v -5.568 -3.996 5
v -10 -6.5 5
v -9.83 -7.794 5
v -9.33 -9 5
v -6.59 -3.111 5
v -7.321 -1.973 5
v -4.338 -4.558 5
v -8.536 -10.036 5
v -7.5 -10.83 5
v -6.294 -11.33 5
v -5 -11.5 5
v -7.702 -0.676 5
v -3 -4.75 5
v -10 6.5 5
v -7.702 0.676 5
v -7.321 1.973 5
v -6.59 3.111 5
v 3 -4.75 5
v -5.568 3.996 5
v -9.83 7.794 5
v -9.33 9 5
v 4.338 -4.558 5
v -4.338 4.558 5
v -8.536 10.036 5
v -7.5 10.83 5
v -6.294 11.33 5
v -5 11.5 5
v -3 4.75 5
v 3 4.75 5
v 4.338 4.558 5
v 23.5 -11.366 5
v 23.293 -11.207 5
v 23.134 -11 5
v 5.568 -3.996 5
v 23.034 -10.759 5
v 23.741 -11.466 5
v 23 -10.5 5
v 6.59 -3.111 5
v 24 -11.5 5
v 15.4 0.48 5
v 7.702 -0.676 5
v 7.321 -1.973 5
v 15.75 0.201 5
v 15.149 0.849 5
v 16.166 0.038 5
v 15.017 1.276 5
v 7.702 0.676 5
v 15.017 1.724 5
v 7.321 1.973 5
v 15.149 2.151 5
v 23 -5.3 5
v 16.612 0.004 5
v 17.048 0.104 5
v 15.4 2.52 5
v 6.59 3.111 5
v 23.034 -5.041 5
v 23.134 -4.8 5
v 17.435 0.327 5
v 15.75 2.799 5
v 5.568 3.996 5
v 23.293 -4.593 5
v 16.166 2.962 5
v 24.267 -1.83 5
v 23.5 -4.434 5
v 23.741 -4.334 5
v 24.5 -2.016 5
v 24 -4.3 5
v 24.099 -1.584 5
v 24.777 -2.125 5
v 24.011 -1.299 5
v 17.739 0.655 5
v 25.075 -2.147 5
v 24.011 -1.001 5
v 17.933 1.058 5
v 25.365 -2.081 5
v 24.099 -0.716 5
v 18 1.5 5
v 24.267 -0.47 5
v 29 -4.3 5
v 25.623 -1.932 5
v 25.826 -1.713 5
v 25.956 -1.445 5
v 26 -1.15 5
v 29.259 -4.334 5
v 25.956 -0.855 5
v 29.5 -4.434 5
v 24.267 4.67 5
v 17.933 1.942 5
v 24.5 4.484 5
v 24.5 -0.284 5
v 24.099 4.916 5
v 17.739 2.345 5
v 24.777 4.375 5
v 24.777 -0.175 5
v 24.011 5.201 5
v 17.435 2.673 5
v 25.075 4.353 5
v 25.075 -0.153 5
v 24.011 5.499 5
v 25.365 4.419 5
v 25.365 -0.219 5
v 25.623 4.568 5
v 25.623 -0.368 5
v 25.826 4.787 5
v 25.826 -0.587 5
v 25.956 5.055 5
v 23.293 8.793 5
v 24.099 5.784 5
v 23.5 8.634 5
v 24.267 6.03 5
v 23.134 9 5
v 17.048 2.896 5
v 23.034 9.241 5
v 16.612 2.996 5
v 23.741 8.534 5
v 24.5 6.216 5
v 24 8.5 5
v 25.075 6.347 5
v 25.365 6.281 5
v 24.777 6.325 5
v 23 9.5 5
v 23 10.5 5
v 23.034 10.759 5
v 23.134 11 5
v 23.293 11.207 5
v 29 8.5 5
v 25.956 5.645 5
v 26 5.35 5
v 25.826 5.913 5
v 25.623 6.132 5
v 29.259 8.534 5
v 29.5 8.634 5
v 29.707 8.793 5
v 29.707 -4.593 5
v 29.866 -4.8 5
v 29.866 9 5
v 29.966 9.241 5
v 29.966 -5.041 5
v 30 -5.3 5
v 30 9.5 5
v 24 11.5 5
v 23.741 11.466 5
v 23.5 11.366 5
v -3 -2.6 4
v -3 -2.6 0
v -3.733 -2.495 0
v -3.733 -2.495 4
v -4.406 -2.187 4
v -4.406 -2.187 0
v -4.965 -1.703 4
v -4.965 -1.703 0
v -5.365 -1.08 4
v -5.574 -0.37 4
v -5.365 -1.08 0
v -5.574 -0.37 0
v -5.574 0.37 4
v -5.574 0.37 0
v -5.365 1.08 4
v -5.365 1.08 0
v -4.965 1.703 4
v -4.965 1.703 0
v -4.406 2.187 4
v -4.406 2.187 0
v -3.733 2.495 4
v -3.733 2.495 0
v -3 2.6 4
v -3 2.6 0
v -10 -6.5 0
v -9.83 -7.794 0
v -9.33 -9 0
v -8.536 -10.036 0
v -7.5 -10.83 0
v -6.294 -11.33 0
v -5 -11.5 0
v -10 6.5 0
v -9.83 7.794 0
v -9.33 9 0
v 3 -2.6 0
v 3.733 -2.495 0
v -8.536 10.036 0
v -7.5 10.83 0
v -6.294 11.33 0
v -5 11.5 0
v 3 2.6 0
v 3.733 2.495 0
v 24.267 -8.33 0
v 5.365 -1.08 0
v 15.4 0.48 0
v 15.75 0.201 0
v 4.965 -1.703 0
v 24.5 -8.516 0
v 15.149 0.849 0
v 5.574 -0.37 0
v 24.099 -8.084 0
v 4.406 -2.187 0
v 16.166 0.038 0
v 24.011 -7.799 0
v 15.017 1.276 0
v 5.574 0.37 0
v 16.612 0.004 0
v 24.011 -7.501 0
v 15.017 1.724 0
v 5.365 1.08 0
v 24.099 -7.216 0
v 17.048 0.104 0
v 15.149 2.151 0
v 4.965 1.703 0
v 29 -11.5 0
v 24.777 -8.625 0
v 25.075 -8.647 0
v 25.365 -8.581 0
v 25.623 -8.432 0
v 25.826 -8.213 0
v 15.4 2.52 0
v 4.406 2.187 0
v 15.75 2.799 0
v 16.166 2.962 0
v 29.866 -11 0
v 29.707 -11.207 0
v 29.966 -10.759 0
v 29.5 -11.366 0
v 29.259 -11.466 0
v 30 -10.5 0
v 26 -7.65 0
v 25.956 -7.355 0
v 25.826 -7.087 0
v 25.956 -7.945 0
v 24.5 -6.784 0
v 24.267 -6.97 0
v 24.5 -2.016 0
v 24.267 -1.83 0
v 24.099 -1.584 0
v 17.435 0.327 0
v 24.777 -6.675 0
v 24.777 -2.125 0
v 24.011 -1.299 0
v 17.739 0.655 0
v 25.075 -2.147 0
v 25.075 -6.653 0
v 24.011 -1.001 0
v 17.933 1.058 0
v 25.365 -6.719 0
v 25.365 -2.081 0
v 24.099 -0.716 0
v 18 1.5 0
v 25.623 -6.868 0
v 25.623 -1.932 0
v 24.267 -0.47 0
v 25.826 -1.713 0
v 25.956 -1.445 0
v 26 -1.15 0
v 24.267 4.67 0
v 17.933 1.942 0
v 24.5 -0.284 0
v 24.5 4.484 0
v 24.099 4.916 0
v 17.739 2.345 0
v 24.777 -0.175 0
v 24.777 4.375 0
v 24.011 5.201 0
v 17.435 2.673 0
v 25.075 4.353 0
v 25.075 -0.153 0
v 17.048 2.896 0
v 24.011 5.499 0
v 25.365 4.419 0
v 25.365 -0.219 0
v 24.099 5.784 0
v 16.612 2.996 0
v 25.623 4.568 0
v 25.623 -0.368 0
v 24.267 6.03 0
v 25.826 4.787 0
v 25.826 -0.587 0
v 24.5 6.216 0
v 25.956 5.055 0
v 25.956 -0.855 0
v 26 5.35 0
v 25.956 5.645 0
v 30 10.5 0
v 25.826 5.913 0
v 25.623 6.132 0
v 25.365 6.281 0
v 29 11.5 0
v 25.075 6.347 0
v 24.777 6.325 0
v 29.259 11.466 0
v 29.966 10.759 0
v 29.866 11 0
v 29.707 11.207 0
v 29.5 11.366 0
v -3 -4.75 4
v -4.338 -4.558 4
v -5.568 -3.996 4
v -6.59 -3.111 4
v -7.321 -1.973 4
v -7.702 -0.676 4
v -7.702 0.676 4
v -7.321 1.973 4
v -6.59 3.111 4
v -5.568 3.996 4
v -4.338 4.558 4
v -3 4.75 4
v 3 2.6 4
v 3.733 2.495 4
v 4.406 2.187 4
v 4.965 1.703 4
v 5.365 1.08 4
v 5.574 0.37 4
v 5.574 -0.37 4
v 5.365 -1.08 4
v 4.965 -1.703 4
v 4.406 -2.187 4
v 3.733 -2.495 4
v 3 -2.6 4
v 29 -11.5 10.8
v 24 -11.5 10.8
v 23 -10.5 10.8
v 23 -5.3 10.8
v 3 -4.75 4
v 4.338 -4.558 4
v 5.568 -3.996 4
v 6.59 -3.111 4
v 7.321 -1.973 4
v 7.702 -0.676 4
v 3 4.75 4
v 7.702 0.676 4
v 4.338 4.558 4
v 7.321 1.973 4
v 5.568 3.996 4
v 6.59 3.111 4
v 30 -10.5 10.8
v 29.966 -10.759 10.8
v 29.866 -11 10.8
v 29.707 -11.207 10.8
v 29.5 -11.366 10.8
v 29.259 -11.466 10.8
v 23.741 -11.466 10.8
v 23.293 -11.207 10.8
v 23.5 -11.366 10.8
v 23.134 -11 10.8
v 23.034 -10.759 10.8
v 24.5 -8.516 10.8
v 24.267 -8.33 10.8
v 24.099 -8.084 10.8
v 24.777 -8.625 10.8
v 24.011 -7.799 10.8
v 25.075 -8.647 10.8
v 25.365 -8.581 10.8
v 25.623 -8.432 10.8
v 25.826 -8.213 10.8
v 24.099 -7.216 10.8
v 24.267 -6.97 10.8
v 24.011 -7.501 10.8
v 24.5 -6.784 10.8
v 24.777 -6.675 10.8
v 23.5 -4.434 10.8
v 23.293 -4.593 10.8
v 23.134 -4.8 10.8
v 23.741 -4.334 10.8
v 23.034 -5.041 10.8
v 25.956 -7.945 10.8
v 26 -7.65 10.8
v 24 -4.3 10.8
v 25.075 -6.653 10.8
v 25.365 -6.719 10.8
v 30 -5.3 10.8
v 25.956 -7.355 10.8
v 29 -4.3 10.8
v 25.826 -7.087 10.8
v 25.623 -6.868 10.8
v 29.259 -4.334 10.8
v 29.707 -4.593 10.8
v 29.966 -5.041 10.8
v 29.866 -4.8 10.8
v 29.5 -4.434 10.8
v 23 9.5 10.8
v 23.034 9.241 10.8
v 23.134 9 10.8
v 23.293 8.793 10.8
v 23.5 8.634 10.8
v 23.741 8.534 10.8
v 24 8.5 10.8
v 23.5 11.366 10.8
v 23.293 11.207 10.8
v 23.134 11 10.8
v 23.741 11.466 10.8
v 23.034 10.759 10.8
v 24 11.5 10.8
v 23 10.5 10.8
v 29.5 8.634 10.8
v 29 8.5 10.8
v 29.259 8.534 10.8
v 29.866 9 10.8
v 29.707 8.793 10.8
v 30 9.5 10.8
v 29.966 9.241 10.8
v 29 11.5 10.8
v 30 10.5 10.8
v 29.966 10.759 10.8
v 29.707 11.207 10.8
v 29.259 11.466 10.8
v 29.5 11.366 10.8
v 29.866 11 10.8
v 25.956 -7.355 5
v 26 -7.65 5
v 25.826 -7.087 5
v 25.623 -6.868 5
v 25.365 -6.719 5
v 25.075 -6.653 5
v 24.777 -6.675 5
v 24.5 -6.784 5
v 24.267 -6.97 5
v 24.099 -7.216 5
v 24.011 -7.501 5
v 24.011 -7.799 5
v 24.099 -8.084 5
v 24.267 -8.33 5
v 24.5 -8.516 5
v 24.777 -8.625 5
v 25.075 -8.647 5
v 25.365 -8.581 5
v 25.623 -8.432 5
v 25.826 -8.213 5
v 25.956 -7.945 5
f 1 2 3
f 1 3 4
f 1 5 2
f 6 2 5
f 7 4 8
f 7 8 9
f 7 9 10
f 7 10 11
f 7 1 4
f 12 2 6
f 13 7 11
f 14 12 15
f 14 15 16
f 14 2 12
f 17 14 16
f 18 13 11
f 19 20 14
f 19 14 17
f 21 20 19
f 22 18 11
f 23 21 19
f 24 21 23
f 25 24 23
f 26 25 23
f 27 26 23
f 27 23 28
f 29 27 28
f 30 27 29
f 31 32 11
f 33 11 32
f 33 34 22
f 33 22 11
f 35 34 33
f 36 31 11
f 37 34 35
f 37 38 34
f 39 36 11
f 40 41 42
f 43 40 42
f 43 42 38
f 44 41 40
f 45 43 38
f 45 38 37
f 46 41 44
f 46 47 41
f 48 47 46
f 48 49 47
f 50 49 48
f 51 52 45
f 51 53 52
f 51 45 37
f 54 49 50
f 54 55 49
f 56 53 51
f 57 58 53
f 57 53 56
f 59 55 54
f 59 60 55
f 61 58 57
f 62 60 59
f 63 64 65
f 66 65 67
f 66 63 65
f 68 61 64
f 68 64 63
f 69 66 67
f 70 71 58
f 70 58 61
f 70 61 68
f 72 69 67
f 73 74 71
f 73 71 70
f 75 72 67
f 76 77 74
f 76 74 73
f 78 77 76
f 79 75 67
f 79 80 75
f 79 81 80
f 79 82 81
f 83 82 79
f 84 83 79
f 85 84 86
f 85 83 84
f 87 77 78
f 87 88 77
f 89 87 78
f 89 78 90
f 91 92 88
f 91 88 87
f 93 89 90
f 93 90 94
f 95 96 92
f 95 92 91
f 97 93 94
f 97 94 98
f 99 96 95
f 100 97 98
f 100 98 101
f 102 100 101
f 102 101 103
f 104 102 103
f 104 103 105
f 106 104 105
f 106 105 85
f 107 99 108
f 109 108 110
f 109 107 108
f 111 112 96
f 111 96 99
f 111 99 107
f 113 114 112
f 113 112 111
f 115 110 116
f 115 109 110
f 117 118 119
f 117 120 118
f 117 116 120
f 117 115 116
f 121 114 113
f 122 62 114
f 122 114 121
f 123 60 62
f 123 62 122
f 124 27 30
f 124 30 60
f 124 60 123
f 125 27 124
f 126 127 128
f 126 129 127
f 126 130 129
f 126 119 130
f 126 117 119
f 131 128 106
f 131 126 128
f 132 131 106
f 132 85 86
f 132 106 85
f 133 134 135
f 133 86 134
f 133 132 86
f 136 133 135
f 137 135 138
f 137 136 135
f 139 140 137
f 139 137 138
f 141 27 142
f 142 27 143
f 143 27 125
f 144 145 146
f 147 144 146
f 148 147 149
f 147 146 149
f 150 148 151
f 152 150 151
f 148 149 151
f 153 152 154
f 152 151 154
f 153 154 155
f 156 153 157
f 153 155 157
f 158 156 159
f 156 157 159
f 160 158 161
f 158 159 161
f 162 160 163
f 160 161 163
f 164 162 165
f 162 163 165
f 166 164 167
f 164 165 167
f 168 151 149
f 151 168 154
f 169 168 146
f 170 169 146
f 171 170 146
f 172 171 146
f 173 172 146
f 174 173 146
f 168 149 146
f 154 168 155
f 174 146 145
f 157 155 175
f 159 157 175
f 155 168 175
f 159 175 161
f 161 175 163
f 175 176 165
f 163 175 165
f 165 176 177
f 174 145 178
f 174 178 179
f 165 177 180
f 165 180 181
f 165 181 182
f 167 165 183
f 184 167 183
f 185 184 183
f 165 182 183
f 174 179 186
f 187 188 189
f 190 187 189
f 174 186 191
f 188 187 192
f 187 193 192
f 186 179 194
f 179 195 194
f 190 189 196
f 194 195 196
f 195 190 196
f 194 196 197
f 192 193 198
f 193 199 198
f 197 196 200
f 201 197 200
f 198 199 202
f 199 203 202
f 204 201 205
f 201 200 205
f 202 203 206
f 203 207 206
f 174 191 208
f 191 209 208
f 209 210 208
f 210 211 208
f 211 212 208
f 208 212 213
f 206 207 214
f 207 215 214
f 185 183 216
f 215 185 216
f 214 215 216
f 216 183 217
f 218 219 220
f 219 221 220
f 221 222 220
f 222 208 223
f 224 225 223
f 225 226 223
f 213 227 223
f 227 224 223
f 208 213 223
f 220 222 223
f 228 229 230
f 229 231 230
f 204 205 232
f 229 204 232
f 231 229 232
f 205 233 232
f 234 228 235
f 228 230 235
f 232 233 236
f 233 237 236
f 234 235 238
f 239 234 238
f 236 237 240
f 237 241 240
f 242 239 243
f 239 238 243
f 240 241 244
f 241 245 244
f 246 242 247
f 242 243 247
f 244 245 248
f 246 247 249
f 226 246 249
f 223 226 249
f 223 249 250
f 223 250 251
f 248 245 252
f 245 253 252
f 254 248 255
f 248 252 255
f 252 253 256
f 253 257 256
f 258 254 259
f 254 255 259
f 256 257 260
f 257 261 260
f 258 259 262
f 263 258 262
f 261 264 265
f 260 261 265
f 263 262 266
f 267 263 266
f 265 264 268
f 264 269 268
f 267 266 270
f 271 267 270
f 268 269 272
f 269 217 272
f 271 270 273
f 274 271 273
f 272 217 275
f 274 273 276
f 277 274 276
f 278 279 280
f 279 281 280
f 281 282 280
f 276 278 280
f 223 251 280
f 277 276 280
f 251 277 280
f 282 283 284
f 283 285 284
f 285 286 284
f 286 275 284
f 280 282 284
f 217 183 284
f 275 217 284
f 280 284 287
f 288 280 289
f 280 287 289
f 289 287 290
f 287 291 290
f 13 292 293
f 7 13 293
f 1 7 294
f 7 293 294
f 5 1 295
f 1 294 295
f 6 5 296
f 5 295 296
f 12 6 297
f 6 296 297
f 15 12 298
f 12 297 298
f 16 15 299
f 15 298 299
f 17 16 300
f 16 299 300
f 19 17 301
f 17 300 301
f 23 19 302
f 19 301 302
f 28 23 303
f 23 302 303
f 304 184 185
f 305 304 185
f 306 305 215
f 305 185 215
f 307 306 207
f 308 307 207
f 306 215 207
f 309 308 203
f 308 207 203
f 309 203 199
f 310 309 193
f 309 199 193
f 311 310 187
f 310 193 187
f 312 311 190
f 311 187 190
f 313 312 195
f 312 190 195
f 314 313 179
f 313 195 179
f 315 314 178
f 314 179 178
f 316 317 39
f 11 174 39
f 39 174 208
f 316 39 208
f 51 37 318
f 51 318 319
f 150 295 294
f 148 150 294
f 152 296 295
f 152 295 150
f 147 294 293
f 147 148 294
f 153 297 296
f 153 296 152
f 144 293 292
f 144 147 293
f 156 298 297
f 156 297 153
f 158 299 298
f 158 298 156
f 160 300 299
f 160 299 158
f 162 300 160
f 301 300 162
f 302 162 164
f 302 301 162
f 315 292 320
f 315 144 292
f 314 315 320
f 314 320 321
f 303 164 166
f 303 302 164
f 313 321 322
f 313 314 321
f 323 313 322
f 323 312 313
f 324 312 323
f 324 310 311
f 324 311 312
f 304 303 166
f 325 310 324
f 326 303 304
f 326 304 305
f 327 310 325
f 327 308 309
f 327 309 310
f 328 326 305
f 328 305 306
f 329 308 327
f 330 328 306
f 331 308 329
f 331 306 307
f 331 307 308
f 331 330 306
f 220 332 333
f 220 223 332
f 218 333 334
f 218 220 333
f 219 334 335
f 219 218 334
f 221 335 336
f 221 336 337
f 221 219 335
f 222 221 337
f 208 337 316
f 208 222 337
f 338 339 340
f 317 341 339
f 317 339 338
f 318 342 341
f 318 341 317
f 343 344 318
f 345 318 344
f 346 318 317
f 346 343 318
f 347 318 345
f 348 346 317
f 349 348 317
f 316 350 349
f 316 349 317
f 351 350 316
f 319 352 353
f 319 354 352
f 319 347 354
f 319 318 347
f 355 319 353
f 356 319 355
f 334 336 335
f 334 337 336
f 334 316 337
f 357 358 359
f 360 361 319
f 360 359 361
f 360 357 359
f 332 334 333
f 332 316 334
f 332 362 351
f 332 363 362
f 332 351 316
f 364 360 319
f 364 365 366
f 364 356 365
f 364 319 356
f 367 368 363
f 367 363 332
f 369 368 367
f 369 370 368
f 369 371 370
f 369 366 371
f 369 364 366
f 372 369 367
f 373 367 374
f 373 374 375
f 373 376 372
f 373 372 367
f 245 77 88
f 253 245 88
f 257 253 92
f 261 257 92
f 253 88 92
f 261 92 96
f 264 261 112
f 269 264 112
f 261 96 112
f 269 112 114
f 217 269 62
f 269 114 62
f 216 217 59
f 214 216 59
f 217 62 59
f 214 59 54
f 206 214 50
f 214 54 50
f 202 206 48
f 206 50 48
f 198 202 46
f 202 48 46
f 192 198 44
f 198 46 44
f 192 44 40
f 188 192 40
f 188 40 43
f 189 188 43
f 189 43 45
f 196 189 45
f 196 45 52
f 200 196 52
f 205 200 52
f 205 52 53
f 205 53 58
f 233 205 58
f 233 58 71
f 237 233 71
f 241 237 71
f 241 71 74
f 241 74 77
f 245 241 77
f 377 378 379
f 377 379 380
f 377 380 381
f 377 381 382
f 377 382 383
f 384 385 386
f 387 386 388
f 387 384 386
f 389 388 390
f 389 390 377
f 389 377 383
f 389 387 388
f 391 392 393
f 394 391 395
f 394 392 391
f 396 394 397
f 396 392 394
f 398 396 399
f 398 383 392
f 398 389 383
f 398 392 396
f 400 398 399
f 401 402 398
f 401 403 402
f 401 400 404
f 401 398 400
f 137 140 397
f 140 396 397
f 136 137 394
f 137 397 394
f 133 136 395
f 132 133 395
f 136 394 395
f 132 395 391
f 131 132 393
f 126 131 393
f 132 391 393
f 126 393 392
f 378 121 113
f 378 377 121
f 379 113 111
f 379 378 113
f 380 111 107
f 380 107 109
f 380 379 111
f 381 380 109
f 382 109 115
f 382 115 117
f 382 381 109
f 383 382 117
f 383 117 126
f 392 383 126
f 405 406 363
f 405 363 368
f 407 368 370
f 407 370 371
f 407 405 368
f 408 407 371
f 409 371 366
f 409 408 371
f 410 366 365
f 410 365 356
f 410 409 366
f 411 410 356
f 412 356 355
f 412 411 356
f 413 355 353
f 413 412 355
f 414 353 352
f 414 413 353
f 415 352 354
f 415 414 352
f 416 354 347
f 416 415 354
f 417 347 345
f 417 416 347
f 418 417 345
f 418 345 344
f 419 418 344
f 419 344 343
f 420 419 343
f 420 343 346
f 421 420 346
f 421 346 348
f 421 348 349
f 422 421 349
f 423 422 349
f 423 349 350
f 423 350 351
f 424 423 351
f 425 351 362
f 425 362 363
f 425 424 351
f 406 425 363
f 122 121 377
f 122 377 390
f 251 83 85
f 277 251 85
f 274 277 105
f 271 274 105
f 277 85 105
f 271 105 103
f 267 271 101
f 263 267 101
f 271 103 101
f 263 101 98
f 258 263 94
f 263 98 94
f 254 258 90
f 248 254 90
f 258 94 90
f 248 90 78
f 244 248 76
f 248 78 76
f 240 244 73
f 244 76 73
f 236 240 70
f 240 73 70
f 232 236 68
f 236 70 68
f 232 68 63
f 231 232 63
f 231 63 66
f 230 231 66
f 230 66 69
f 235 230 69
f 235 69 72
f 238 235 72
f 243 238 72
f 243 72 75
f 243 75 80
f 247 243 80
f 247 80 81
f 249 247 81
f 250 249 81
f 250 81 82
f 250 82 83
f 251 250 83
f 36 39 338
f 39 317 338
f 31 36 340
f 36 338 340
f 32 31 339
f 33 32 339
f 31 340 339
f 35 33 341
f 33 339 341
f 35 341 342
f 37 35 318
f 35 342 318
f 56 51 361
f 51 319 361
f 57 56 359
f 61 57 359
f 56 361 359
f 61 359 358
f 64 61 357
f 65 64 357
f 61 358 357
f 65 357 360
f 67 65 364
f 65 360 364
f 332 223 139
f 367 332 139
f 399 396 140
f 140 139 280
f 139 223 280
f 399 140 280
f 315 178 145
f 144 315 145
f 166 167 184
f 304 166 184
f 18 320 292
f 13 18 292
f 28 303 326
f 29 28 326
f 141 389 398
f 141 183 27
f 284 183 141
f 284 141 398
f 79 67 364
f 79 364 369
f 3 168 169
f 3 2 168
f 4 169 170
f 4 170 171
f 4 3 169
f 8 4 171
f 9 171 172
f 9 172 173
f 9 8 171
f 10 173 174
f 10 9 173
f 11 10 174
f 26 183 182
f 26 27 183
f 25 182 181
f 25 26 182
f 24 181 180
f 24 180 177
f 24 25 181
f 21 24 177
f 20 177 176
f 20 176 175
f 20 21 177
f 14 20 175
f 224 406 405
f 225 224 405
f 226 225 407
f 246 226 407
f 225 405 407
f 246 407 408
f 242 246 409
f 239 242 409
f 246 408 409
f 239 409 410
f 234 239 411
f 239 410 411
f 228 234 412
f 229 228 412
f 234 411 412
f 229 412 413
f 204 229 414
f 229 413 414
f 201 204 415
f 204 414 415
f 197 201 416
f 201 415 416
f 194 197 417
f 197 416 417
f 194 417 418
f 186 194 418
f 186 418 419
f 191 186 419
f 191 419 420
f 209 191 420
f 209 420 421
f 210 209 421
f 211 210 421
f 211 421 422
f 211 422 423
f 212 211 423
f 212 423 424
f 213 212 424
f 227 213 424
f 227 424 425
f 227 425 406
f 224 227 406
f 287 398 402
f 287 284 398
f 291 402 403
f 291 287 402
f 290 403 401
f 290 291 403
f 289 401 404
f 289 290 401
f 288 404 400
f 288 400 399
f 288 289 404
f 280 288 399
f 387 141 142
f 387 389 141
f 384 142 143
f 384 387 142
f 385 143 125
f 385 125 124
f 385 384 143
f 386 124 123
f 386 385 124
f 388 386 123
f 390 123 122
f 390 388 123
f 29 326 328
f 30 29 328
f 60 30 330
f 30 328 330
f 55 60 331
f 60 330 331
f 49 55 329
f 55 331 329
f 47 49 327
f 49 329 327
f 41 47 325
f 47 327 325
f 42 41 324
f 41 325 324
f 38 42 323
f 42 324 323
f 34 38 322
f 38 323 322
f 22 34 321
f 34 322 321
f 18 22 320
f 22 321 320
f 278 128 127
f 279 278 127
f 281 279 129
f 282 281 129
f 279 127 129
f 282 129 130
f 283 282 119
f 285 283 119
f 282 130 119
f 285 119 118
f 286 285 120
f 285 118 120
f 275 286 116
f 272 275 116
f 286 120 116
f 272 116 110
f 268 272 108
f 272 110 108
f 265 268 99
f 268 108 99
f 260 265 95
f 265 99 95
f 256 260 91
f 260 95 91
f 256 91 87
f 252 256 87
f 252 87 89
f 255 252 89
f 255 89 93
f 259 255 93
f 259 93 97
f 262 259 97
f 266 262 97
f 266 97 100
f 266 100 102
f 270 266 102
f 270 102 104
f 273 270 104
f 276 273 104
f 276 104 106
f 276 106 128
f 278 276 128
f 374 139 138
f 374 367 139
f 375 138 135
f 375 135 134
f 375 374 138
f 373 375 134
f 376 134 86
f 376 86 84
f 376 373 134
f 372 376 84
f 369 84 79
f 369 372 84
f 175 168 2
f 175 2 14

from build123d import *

# Parameters (mm, degrees)
F0_W     = 20
F0_H     = 23
F1_DEPTH = 5
F2_W     = 7
F2_H     = 3
F2_H_2   = 7.2
F2_R     = 1
F3_DEPTH = 5.8
F4_DEPTH = 5.001
F5_R     = 5
F6_R     = 1
F7_R     = 1
F8_DEPTH = 4
F2_R_2   = 1.5
F9_DEPTH = 5.001


with BuildPart() as f1:
    # F0 (on Top) → F1 (new body)
    with BuildSketch(Plane.XY):
        Rectangle(F0_W, F0_H)
        with BuildLine():
            Line((-3, 4.75), (3, 4.75))
            ThreePointArc((3, 4.75), (7.75, 0), (3, -4.75))
            Line((3, -4.75), (-3, -4.75))
            ThreePointArc((-3, -4.75), (-7.75, 0), (-3, 4.75))
        make_face(mode=Mode.SUBTRACT)
        with Locations((20, 0)):
            Rectangle(F0_W, F0_H)
    extrude(amount=F1_DEPTH)

    # F2 (on face) → F3 (join)
    with BuildSketch(Plane.XY.offset(5)):
        with Locations((26.5, 10)):
            Rectangle(F2_W, F2_H)
        with Locations((26.5, -7.9)):
            Rectangle(F2_W, F2_H_2)
        with Locations((25, -7.65)):
            Circle(F2_R, mode=Mode.SUBTRACT)
    extrude(amount=F3_DEPTH)

    # F2 (on face) → F4 (cut, through all)
    with BuildSketch(Plane.XY.offset(5)):
        with Locations((25, 5.35)):
            Circle(F2_R)
        with Locations((25, -1.15)):
            Circle(F2_R)
        with Locations((25, -7.65)):
            Circle(F2_R)
    extrude(amount=-F4_DEPTH, mode=Mode.SUBTRACT)

    # F5
    f5_edges = [f1.edges().sort_by_distance(p)[0] for p in [
        (-10, -11.5, 2.5),
        (-10, 11.5, 2.5),
    ]]
    fillet(f5_edges, radius=F5_R)

    # F6
    f6_edges = [f1.edges().sort_by_distance(p)[0] for p in [
        (30, -11.5, 5.4),
        (30, 11.5, 5.4),
    ]]
    fillet(f6_edges, radius=F6_R)

    # F7
    f7_edges = [f1.edges().sort_by_distance(p)[0] for p in [
        (23, 8.5, 7.9),
        (23, -4.3, 7.9),
        (30, -4.3, 7.9),
        (30, 8.5, 7.9),
        (23, -11.5, 7.9),
        (23, 11.5, 7.9),
    ]]
    fillet(f7_edges, radius=F7_R)

    # F0 (on Top) → F8 (join)
    with BuildSketch(Plane.XY):
        with BuildLine():
            ThreePointArc((3, -4.75), (7.75, 0), (3, 4.75))
            Line((3, 4.75), (-3, 4.75))
            ThreePointArc((-3, 4.75), (-7.75, 0), (-3, -4.75))
            Line((-3, -4.75), (3, -4.75))
        make_face()
        with BuildLine():
            Line((-3, 2.6), (3, 2.6))
            ThreePointArc((3, 2.6), (5.6, 0), (3, -2.6))
            Line((3, -2.6), (-3, -2.6))
            ThreePointArc((-3, -2.6), (-5.6, 0), (-3, 2.6))
        make_face(mode=Mode.SUBTRACT)
    extrude(amount=F8_DEPTH)

    # F2 (on face) → F9 (cut, through all)
    with BuildSketch(Plane.XY.offset(5)):
        with Locations((16.5, 1.5)):
            Circle(F2_R_2)
    extrude(amount=-F9_DEPTH, mode=Mode.SUBTRACT)


solid = f1.part
